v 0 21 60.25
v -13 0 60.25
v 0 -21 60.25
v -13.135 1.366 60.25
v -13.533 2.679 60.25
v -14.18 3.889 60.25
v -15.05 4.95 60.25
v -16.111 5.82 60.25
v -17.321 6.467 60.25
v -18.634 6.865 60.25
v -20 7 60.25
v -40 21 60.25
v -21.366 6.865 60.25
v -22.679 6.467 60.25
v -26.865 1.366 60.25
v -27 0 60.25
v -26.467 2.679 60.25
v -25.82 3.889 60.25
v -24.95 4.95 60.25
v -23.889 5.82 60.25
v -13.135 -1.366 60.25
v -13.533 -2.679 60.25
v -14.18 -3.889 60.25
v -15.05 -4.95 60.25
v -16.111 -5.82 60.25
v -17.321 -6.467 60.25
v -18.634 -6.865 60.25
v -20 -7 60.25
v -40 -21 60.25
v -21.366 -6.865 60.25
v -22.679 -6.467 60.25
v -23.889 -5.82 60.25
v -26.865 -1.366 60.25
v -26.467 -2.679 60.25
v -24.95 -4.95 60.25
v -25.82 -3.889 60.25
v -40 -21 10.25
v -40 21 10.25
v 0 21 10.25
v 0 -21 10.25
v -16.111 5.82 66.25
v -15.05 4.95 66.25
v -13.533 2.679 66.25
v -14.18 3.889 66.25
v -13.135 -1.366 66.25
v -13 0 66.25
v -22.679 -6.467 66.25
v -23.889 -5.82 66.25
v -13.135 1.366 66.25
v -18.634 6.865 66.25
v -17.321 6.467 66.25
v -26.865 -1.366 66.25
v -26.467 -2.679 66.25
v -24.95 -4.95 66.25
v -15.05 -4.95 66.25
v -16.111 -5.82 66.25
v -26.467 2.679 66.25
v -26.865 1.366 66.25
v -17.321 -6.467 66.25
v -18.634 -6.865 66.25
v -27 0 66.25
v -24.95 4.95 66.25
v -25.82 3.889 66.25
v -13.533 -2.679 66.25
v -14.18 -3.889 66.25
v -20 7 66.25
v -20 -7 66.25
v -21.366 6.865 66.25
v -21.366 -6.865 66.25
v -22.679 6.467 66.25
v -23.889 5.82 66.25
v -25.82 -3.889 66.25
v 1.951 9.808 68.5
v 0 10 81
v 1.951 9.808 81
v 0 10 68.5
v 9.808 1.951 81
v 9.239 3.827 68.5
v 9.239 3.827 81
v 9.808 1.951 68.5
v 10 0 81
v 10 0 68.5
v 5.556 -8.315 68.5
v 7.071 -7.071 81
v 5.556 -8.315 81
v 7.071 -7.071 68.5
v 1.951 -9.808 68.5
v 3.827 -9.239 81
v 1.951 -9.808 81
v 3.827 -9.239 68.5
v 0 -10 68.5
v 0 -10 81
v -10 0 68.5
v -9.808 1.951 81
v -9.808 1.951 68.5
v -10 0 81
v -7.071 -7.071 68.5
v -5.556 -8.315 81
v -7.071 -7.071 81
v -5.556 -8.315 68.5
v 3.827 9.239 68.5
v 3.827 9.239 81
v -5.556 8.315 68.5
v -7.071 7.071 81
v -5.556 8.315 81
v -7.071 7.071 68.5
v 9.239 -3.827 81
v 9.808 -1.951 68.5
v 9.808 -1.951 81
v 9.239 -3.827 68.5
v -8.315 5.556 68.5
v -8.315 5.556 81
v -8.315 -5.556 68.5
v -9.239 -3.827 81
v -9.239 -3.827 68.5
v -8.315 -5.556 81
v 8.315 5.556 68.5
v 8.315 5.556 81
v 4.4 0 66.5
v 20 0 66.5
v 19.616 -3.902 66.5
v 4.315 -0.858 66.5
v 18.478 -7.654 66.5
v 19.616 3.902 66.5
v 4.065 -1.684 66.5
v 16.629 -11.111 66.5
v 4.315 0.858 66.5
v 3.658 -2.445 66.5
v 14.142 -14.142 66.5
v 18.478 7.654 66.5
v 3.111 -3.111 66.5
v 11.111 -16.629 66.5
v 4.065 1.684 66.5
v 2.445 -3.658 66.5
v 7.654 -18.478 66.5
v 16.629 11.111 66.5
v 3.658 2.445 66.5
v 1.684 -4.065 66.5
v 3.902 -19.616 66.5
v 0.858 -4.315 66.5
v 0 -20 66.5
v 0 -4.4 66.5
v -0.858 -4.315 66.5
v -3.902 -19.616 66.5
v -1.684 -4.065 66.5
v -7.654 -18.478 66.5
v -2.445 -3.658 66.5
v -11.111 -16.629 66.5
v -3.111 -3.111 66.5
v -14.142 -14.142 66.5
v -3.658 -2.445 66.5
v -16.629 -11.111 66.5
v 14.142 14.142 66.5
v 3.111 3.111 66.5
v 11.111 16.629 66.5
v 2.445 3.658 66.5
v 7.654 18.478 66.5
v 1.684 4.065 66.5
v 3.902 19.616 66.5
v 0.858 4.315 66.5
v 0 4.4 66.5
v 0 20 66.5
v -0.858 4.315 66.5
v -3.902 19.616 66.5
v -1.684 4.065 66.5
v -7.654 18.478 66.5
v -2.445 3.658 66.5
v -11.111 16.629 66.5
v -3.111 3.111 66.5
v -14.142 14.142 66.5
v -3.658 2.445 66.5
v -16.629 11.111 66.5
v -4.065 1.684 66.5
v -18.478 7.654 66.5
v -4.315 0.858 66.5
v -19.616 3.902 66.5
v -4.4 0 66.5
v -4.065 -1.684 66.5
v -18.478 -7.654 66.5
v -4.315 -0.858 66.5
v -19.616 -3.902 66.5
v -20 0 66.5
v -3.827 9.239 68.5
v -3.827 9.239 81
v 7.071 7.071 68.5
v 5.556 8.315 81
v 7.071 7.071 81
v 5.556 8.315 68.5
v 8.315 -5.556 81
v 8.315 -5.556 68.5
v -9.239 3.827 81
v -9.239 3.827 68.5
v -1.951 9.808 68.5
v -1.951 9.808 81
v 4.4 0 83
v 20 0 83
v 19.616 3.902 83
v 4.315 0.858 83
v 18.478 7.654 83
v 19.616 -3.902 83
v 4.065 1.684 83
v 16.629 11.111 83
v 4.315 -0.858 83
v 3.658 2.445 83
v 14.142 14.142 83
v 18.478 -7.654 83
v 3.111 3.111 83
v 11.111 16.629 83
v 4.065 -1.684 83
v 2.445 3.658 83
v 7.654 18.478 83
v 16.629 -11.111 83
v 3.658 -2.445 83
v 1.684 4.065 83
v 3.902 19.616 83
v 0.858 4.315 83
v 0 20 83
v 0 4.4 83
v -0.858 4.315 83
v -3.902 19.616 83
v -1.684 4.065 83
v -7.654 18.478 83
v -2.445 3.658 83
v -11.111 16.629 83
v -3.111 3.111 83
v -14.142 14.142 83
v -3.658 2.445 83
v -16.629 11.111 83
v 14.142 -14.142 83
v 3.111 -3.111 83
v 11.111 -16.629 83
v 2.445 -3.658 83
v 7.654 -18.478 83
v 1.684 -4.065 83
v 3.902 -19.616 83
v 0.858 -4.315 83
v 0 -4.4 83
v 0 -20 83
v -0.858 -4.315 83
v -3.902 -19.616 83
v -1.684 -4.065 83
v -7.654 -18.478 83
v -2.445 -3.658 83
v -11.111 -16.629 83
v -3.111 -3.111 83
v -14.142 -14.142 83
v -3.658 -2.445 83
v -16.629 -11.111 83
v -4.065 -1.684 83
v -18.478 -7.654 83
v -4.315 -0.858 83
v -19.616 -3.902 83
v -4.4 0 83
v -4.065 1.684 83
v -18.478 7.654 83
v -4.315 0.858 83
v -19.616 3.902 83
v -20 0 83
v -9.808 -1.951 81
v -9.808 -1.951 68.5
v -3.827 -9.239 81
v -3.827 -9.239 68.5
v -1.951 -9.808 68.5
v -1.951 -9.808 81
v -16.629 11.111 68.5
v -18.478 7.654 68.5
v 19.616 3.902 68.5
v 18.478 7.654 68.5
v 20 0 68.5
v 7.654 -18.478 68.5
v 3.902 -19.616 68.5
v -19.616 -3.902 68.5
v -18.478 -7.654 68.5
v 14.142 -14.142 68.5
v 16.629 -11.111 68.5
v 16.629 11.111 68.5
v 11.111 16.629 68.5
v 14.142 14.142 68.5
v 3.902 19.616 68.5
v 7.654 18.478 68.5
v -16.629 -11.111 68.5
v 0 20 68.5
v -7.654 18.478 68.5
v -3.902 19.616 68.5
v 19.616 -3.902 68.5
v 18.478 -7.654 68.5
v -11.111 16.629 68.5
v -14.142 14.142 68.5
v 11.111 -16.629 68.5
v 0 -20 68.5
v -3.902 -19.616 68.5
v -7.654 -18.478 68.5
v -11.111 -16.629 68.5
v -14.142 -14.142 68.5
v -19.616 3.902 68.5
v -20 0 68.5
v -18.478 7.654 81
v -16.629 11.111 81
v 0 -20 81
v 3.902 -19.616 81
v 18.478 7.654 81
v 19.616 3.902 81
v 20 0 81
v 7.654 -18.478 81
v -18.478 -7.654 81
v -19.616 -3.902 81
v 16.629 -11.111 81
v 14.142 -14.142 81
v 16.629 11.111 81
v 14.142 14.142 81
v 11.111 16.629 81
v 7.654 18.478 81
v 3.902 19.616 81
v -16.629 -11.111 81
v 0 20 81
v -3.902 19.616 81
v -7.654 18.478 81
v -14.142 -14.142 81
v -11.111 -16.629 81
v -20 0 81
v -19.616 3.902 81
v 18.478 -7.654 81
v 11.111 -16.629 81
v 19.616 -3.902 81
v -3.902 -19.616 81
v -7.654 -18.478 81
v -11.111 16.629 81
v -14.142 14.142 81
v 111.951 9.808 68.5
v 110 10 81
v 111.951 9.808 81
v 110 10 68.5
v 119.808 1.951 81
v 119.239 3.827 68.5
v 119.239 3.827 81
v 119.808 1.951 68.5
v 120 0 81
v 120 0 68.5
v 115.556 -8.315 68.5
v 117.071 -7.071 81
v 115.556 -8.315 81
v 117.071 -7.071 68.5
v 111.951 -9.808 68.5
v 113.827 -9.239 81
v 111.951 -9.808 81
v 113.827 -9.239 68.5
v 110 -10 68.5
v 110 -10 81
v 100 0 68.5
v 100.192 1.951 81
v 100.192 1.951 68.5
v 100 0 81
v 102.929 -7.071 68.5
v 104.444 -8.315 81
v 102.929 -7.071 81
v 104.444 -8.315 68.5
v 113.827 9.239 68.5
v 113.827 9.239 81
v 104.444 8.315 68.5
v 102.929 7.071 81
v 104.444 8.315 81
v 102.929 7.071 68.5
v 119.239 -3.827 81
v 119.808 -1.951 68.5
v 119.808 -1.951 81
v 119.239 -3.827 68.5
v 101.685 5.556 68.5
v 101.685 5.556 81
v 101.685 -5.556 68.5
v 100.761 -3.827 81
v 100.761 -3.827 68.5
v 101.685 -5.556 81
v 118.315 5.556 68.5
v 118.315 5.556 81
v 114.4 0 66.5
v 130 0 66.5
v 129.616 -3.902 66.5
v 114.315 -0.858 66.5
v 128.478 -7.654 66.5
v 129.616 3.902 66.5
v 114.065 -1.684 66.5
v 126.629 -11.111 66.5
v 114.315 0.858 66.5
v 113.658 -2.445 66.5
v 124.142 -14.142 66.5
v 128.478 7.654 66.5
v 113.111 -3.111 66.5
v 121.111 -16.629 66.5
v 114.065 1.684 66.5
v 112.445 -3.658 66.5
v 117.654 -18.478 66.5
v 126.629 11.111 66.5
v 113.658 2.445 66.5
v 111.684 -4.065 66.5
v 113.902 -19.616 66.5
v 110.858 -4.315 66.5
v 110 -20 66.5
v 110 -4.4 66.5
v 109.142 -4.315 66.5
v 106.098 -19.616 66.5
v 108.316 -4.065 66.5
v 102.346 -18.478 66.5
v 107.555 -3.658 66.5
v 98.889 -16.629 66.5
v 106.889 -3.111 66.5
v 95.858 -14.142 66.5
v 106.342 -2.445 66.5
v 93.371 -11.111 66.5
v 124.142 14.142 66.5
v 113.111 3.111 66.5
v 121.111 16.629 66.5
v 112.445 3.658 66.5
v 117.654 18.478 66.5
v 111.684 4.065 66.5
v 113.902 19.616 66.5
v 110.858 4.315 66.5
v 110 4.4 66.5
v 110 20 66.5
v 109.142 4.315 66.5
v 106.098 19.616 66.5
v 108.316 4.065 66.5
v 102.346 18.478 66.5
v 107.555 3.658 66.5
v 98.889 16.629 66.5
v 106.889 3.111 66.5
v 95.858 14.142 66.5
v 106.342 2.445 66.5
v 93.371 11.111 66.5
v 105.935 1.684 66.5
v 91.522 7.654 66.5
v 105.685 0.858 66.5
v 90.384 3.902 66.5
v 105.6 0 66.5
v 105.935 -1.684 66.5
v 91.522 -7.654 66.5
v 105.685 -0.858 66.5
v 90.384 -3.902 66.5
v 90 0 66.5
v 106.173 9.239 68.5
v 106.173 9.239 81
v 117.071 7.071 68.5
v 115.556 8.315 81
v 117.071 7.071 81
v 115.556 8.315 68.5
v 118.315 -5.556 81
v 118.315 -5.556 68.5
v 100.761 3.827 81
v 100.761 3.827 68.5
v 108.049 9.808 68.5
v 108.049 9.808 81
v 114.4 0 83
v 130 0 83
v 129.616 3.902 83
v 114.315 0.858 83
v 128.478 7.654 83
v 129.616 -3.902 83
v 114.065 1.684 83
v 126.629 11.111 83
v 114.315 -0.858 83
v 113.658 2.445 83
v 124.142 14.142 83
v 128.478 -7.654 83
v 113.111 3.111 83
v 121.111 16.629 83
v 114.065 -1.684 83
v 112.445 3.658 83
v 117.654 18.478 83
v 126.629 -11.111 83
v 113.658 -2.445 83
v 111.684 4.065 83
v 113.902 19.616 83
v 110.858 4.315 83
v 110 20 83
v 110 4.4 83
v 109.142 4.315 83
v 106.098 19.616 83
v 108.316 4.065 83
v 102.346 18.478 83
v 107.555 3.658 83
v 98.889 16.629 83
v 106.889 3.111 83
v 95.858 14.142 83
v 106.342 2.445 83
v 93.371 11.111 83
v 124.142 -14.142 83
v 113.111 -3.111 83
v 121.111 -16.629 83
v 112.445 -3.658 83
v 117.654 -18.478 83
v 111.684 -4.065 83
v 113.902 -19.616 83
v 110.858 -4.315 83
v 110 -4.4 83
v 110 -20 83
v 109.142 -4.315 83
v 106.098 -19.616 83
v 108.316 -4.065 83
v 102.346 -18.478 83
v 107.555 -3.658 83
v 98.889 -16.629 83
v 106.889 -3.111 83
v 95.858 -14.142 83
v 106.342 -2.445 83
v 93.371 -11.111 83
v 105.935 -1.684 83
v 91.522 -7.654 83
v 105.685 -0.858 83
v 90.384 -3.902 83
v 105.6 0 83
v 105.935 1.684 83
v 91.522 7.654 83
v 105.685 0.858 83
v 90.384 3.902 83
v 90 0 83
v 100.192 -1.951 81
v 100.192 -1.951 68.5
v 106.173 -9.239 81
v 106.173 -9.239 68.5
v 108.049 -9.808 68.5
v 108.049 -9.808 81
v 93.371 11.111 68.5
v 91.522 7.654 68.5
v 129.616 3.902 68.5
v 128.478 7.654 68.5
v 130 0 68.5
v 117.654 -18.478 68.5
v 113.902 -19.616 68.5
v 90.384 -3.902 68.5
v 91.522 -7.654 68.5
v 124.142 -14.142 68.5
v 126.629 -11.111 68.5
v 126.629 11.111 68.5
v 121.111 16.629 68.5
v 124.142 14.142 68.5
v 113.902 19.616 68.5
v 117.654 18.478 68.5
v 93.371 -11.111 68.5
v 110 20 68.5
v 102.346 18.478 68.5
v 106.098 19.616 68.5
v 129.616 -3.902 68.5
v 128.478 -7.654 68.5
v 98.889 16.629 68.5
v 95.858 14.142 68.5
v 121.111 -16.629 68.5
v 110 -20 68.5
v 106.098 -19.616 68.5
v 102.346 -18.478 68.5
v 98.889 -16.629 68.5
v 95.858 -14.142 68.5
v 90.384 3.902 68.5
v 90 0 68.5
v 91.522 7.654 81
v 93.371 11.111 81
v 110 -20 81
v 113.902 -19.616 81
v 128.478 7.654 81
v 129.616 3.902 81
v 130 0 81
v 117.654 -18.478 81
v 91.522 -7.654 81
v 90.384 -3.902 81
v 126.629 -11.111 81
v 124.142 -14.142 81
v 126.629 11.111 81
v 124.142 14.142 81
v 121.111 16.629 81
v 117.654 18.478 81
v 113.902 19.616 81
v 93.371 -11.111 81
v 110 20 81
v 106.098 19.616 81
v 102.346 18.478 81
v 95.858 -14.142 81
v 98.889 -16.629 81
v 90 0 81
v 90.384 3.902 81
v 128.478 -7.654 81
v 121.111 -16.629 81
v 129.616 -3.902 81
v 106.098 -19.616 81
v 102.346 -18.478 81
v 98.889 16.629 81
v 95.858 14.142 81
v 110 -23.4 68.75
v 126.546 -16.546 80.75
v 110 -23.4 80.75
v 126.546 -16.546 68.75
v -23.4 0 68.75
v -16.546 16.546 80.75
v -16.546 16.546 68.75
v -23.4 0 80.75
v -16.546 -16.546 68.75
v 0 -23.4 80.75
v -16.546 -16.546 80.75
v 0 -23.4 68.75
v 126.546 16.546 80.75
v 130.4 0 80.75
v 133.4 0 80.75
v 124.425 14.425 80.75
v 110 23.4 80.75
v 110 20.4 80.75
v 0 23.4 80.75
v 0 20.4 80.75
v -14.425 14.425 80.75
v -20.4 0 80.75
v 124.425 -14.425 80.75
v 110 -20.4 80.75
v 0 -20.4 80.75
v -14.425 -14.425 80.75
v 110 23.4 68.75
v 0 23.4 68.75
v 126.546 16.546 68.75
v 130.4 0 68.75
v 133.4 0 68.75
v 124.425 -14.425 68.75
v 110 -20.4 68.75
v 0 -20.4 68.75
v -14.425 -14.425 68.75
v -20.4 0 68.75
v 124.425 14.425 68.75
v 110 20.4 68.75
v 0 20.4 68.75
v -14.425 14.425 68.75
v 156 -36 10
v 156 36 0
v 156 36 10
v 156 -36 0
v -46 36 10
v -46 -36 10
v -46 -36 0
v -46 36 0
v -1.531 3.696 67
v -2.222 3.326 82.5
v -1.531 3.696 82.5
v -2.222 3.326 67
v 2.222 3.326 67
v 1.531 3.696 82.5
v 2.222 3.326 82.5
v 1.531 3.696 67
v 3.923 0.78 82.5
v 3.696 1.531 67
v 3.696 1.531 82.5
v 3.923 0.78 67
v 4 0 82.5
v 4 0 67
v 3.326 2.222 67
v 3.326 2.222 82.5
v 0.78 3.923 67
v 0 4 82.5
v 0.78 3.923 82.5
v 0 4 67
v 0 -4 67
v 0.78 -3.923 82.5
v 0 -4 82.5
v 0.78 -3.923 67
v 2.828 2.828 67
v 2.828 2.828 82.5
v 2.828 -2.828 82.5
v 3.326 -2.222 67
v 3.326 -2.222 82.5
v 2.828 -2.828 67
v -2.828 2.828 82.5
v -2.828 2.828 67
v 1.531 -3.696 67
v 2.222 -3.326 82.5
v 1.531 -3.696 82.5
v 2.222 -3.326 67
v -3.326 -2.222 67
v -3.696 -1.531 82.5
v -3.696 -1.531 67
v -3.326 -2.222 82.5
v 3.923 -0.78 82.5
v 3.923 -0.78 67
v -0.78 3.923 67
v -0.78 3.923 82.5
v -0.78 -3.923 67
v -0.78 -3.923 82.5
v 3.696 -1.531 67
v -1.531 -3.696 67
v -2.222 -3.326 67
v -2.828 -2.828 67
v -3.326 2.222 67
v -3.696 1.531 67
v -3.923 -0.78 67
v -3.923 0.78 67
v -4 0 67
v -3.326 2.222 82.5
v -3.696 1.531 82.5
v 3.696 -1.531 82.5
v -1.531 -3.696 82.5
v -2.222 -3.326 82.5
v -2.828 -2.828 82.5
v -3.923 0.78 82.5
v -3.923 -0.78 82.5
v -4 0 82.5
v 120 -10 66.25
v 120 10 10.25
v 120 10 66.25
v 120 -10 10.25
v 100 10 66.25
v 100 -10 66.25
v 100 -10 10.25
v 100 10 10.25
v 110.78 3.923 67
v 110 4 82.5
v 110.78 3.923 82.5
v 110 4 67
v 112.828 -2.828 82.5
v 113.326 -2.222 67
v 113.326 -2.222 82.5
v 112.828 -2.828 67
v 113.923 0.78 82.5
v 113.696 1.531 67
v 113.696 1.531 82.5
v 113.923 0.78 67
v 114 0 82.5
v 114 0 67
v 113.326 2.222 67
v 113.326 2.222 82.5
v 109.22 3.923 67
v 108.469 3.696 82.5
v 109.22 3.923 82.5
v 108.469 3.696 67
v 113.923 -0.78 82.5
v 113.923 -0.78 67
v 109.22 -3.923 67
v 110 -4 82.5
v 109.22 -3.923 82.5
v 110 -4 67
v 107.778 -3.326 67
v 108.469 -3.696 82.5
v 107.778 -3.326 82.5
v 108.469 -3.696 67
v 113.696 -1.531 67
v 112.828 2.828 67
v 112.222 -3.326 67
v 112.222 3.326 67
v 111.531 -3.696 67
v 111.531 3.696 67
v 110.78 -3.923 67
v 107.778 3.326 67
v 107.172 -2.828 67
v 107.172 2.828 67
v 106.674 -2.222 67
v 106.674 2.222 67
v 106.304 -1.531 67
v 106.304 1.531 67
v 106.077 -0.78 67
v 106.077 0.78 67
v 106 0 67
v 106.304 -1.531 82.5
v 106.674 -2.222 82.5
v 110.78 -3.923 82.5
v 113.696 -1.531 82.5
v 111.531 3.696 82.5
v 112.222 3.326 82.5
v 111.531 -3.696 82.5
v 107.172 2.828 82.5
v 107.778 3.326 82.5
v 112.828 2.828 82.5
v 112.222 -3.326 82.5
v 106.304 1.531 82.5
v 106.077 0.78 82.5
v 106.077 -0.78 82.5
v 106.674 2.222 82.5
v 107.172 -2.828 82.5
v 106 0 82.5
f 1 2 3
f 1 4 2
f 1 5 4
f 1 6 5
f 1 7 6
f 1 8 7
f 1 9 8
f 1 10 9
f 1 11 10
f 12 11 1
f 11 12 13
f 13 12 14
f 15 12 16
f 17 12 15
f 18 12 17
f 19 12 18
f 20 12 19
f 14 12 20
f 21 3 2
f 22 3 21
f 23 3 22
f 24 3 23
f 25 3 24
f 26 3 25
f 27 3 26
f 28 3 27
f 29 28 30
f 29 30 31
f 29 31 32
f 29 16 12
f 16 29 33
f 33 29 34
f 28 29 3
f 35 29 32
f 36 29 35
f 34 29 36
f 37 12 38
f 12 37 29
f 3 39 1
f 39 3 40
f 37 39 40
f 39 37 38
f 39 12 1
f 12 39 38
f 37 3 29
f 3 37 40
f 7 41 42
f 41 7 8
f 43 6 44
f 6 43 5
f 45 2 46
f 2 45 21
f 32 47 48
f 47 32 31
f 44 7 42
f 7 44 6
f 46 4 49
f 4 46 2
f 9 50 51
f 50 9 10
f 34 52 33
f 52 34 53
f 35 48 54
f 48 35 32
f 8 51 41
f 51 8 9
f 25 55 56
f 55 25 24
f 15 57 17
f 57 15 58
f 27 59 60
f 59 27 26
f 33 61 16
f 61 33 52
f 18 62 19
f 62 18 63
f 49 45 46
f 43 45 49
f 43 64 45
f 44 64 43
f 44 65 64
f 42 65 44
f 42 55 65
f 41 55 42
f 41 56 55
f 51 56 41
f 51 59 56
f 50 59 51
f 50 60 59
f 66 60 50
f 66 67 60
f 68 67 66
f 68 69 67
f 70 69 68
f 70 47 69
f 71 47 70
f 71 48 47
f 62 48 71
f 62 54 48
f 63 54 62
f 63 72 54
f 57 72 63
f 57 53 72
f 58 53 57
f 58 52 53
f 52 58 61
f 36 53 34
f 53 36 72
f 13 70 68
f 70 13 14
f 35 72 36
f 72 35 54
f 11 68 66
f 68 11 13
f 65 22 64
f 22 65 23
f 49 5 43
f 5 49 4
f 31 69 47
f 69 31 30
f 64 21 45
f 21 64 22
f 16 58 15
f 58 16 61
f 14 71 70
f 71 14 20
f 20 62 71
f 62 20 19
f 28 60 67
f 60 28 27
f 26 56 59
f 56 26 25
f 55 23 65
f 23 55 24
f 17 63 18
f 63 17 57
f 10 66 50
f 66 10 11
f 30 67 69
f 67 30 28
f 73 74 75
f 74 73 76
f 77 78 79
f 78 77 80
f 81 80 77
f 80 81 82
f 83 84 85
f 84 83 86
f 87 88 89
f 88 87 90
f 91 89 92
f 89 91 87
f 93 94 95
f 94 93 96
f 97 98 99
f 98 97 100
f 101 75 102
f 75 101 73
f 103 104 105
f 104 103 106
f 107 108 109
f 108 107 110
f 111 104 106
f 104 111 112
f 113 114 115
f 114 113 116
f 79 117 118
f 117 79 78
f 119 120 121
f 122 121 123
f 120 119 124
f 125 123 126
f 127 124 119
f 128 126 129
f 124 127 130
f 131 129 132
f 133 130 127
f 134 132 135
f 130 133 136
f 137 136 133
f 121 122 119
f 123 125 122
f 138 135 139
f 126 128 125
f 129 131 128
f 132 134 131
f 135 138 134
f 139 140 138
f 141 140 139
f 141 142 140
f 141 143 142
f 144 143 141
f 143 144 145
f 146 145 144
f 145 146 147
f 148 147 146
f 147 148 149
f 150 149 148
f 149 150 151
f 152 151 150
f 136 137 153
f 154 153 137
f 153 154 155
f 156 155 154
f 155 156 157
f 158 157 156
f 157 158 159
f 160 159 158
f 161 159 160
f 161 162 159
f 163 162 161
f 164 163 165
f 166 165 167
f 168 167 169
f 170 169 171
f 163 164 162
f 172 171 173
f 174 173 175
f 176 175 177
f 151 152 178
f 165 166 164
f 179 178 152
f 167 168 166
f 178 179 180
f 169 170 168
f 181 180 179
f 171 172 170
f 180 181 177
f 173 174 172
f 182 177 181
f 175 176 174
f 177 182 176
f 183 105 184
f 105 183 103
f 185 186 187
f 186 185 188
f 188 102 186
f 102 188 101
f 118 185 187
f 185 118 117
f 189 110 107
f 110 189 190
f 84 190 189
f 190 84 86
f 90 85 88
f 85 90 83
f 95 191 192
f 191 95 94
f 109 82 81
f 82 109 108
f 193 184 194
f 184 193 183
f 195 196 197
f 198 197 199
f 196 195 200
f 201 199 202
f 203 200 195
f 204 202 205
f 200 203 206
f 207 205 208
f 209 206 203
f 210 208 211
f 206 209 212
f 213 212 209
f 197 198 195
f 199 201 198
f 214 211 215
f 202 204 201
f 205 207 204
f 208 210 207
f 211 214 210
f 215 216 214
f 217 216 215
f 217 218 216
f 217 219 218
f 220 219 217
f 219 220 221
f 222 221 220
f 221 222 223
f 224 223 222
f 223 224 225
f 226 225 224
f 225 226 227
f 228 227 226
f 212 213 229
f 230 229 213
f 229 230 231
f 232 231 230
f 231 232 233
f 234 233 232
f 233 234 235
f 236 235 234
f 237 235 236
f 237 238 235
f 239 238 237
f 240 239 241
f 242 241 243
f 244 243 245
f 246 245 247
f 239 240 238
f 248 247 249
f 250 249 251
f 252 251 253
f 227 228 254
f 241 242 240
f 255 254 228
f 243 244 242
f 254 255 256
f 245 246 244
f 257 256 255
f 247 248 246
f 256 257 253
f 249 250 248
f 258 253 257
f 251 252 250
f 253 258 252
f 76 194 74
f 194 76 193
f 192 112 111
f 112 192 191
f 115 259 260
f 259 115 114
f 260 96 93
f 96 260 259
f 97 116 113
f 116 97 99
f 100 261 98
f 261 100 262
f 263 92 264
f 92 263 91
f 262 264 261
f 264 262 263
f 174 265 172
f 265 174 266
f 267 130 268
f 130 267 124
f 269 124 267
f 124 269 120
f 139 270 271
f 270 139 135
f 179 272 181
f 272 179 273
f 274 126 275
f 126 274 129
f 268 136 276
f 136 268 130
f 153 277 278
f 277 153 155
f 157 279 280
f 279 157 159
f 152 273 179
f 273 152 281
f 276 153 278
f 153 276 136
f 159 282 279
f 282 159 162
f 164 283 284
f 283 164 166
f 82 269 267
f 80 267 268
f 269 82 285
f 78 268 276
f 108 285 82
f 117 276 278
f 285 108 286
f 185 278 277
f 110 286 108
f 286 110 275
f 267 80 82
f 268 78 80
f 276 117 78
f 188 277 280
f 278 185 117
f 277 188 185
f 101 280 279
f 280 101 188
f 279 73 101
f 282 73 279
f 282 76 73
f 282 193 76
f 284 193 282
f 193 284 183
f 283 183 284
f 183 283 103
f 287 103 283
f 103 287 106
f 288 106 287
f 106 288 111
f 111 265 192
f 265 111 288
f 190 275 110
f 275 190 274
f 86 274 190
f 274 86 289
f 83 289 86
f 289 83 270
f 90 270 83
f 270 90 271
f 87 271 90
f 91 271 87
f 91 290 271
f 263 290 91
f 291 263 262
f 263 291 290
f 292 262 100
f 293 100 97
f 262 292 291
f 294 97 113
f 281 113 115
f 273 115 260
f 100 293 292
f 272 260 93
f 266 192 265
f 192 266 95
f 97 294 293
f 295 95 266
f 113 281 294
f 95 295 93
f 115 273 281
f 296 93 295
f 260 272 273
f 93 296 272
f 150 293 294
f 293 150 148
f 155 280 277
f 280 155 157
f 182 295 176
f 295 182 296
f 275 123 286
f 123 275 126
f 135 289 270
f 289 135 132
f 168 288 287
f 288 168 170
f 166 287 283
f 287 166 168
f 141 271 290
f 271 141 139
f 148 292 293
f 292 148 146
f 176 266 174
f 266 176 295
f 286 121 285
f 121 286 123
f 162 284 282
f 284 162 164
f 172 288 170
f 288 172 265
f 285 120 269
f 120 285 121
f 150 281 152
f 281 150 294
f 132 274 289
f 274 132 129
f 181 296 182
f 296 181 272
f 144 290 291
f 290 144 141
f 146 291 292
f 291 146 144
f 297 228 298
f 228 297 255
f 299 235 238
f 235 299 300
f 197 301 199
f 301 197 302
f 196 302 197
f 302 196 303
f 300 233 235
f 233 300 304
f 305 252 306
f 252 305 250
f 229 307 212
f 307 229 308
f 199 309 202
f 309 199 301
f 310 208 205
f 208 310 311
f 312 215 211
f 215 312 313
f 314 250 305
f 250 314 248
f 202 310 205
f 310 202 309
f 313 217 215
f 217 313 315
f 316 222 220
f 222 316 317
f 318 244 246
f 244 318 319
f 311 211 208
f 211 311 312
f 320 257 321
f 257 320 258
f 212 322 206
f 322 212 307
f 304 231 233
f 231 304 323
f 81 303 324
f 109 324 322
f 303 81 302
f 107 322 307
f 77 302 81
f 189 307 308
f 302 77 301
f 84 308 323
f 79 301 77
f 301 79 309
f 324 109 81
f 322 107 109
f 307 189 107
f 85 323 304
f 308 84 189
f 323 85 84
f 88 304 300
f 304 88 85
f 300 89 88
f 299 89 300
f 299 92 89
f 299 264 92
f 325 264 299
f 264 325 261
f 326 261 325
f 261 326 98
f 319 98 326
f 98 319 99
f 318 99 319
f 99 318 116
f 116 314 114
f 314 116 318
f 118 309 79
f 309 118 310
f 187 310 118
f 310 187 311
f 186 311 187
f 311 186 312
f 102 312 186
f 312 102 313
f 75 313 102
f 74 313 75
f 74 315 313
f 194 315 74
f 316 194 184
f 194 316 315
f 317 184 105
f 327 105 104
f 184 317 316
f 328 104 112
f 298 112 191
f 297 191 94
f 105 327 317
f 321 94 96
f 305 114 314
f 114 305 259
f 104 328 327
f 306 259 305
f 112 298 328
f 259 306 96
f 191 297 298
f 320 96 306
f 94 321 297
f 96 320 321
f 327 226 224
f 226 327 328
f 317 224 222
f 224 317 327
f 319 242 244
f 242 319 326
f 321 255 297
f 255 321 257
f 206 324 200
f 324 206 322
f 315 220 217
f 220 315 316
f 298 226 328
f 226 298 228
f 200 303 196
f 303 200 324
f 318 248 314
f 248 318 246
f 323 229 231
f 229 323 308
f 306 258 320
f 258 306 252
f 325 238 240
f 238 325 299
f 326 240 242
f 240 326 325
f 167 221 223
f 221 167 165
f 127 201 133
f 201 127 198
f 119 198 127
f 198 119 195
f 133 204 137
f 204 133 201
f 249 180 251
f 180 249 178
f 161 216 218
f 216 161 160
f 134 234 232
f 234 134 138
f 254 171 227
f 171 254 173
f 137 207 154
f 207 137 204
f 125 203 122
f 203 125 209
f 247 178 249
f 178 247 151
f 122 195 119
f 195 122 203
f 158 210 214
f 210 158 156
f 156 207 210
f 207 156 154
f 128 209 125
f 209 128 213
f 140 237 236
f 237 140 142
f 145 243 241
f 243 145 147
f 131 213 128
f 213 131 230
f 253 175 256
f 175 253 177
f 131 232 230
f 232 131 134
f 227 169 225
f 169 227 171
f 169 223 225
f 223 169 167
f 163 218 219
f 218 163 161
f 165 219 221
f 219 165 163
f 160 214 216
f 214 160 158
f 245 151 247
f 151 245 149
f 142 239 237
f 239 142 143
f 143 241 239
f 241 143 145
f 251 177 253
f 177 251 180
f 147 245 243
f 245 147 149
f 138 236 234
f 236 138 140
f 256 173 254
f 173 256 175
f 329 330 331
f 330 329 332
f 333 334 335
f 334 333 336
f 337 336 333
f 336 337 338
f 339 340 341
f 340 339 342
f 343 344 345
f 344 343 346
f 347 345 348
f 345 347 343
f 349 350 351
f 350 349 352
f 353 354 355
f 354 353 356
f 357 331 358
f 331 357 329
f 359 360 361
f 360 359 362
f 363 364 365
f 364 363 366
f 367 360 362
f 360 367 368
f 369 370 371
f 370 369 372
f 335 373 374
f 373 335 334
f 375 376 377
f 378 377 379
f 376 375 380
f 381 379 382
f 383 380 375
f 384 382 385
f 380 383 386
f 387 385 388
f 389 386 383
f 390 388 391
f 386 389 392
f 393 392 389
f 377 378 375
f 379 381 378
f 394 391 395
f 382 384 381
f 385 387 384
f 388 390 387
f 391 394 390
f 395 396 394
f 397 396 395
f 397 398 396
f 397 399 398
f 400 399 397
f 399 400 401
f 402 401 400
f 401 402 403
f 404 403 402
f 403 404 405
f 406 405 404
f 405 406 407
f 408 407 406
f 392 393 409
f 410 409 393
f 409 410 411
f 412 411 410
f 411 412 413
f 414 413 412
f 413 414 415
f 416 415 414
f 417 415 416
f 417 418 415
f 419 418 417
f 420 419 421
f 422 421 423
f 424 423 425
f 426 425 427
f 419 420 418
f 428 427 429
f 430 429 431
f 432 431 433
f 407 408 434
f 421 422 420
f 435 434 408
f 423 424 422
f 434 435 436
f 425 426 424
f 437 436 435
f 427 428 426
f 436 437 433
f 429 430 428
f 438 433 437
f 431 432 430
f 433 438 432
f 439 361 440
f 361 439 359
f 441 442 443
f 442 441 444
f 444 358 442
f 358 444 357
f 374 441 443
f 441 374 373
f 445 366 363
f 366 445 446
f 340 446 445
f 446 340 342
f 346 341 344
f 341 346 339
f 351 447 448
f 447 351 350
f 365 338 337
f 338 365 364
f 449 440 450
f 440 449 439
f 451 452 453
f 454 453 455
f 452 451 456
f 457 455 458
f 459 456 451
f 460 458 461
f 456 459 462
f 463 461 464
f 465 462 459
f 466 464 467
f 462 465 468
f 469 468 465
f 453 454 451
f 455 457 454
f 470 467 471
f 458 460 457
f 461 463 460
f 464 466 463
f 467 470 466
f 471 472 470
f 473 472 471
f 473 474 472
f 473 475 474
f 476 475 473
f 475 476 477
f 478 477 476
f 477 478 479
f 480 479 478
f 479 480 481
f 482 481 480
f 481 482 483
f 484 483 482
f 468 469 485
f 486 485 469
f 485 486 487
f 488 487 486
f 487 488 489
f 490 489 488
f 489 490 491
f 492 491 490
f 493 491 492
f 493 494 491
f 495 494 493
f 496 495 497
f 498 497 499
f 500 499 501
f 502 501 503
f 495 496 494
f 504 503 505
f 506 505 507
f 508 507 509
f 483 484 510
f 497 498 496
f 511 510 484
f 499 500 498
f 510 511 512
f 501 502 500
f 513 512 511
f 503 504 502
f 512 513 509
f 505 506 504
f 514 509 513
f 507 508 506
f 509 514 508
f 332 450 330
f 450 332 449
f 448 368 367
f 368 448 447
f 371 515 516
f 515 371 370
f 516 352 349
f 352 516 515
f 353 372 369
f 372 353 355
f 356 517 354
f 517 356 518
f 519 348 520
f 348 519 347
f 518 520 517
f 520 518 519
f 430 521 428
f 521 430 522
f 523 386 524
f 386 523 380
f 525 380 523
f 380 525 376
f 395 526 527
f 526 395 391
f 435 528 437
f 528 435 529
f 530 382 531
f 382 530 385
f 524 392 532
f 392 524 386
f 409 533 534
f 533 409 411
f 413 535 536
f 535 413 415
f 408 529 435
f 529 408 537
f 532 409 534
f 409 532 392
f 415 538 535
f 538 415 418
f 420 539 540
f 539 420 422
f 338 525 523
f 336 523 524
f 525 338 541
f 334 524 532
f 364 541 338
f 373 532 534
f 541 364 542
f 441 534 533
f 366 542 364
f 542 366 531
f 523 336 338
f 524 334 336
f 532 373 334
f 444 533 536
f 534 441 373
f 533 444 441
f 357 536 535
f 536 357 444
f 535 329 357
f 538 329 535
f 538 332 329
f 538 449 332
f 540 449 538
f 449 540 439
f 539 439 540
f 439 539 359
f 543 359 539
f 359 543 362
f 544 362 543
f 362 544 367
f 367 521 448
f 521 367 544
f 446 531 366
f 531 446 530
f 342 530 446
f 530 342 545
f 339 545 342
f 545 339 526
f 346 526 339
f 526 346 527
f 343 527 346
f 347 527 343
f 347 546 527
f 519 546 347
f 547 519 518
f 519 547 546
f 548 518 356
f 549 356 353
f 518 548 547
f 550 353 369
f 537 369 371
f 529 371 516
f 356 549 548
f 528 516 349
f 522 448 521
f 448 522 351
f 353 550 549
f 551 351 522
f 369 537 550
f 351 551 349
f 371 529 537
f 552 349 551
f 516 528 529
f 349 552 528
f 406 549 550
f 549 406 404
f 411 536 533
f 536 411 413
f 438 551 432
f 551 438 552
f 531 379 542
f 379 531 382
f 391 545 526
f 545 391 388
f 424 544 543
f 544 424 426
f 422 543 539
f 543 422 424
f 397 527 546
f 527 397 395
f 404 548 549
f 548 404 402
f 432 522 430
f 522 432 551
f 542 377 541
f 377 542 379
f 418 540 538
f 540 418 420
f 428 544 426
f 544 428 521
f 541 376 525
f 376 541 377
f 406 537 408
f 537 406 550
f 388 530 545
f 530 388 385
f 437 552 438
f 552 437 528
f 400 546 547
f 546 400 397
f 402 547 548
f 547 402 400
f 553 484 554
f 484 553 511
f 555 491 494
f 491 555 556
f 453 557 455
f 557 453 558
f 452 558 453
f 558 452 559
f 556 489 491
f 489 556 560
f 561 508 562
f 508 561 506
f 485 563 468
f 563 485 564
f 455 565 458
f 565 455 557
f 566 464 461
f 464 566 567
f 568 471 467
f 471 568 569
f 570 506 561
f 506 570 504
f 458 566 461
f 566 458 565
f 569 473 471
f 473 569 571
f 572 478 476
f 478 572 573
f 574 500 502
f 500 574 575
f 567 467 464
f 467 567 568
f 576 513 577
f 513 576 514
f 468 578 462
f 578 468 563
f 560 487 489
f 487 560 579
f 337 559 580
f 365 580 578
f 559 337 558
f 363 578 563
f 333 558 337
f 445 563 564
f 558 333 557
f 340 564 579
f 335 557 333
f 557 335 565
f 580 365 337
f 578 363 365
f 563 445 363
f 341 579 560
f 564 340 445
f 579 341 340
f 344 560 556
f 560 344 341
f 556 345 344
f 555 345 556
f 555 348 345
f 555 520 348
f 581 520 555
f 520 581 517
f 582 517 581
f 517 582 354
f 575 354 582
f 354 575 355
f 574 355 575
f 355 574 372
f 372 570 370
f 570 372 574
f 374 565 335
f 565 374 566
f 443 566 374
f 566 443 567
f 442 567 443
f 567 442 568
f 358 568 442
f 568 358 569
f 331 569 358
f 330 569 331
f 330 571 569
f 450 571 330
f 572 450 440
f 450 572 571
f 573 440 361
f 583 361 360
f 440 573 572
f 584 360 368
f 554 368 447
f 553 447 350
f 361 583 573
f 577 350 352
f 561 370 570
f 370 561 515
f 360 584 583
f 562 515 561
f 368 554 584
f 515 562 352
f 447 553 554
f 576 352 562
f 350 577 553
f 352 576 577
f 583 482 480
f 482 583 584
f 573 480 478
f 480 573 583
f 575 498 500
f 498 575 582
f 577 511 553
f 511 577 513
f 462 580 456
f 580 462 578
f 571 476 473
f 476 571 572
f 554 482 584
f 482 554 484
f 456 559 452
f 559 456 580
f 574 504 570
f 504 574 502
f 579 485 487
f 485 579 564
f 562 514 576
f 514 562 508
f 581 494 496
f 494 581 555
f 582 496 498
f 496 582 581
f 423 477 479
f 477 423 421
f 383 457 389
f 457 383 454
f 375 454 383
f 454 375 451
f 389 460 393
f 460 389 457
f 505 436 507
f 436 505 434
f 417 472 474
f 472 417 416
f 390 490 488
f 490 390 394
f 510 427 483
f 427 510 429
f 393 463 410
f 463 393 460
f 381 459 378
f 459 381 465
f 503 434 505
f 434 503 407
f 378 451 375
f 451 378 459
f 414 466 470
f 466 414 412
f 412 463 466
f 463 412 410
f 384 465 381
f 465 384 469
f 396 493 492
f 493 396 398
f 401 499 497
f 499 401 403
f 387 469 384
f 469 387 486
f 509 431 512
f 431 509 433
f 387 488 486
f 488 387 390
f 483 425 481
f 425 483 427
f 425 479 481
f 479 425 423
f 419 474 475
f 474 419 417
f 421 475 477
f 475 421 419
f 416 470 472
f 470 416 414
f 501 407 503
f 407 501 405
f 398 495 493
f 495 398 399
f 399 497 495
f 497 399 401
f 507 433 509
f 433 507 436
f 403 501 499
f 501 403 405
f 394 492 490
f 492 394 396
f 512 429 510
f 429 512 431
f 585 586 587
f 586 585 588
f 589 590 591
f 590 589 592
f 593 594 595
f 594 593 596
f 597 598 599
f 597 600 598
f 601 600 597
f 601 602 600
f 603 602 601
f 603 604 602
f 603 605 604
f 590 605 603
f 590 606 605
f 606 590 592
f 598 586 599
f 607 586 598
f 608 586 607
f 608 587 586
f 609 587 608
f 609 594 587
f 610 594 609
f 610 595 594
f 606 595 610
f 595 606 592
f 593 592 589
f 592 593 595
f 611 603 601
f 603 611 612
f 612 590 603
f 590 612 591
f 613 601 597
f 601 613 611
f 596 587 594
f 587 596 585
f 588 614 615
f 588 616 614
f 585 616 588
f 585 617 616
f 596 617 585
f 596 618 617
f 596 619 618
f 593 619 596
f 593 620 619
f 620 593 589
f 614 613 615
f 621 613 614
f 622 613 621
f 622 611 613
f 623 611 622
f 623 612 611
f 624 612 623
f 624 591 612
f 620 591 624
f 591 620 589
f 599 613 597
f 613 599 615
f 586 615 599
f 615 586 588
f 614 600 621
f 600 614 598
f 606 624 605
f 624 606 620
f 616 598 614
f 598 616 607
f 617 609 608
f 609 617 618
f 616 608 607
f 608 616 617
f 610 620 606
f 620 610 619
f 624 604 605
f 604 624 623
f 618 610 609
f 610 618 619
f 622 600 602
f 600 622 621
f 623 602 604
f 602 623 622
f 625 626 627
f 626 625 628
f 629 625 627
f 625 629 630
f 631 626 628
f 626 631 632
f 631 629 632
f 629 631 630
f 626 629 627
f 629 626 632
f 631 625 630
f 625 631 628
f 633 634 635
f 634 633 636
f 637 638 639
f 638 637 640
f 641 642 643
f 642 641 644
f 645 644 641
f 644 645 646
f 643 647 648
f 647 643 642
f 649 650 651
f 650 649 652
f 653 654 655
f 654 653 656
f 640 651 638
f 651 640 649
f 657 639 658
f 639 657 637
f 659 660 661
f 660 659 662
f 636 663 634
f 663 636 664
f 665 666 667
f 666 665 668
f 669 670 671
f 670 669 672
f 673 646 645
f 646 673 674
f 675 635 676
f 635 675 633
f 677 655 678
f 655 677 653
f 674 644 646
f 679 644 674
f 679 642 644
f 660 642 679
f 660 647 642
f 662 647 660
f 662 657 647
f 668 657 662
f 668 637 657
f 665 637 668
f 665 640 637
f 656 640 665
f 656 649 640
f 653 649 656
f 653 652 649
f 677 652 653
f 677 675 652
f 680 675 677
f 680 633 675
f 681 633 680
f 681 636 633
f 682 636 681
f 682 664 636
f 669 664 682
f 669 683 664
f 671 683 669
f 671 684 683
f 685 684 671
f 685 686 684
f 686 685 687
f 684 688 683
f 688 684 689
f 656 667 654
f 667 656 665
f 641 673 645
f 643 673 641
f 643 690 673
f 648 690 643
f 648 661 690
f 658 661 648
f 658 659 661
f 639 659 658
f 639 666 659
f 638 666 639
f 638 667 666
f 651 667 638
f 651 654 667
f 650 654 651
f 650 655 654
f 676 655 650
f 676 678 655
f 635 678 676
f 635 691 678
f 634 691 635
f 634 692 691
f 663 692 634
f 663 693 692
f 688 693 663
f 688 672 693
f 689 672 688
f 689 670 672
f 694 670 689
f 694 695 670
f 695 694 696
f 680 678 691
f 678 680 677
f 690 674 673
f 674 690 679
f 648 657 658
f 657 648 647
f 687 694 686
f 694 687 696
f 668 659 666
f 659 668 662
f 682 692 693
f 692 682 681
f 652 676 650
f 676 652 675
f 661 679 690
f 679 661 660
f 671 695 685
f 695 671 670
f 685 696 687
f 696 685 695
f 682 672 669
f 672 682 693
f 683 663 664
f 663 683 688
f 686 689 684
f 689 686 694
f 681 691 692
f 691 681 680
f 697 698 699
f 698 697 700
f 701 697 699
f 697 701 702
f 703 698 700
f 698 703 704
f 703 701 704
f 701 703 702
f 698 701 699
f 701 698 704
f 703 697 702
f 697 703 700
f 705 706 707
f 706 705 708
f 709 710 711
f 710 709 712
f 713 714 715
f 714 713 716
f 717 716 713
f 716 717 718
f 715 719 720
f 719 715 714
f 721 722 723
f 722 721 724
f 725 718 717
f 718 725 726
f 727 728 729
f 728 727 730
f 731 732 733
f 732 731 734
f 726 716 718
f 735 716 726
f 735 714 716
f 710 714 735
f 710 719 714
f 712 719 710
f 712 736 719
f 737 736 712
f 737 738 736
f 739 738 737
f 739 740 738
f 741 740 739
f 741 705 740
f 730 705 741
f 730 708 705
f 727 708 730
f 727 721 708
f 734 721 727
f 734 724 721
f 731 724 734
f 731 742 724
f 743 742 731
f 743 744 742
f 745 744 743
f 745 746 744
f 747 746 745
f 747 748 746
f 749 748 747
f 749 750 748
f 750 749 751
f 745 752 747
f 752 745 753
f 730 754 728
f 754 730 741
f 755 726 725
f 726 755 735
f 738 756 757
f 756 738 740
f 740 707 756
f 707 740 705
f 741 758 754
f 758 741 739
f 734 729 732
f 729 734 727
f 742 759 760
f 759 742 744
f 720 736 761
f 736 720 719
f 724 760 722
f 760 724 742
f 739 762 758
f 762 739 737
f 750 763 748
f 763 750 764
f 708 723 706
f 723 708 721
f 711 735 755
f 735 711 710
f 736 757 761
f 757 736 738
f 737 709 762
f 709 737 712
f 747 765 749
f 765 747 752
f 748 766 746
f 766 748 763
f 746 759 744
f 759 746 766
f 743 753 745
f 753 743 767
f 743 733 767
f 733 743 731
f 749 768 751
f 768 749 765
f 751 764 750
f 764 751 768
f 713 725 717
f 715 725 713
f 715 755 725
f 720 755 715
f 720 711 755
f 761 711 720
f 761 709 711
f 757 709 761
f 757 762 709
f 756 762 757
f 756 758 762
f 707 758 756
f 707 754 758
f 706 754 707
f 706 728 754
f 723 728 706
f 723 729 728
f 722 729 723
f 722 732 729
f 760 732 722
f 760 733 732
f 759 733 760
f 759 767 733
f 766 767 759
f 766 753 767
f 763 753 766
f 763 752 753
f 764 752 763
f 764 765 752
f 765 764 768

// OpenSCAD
$fn = 32;

// ------------------------------------------------------------------------
// Motor belt drive: span 110 mm, pulleys d40, belt 12 mm wide
// Every part is its own module, assembly() places every instance.
// ------------------------------------------------------------------------

// --- part 1 ---
module base_plate() {
  difference() {
    translate([-101, -36, 0]) cube([202, 72, 10]);
  }
}

// --- part 2 ---
module motor() {
  union() {
    translate([-25, -21, 0]) cube([50, 42, 40]);
    translate([28, 0, 20]) rotate([0, 90, 0]) cylinder(h = 6, d = 14, center = true);
  }
}

// --- part 3 ---
module drive_shaft() {
  translate([0, 0, -7.75]) cylinder(h = 15.5, d = 8);
}

// --- part 4 ---
module pulley_drive() {
  difference() {
    union() {
      cylinder(h = 16.5, d = 20);
      cylinder(h = 2, d = 40);
      translate([0, 0, 14.5]) cylinder(h = 2, d = 40);
    }
    translate([0, 0, -1]) cylinder(h = 18.5, d = 8.8);
  }
}

// --- part 5 ---
module idler_post() {
  translate([-10, -10, 0]) cube([20, 20, 56]);
}

// --- part 6 ---
module driven_shaft() {
  translate([0, 0, -7.75]) cylinder(h = 15.5, d = 8);
}

// --- part 7 ---
module pulley_driven() {
  difference() {
    union() {
      cylinder(h = 16.5, d = 20);
      cylinder(h = 2, d = 40);
      translate([0, 0, 14.5]) cylinder(h = 2, d = 40);
    }
    translate([0, 0, -1]) cylinder(h = 18.5, d = 8.8);
  }
}

// --- part 8 ---
module drive_belt() {
  difference() {
    linear_extrude(height = 12) polygon(points = concat([for (a = [90 : 45 : 270]) [23.4 * cos(a), 23.4 * sin(a)]], [for (a = [270 : 45 : 450]) [110 + 23.4 * cos(a), 23.4 * sin(a)]]));
    translate([0, 0, -1]) linear_extrude(height = 14) polygon(points = concat([for (a = [90 : 45 : 270]) [20.4 * cos(a), 20.4 * sin(a)]], [for (a = [270 : 45 : 450]) [110 + 20.4 * cos(a), 20.4 * sin(a)]]));
  }
}

// --- assembly ---
module assembly() {
  color([0.80, 0.24, 0.20]) translate([55, 0, 0]) rotate([0, 0, 0]) base_plate();
  color([0.20, 0.45, 0.75]) translate([0, 0, 35.25]) rotate([0, 270, 0]) motor();
  color([0.25, 0.62, 0.32]) translate([0, 0, 74.75]) rotate([0, 0, 0]) drive_shaft();
  color([0.92, 0.70, 0.18]) translate([0, 0, 66.5]) rotate([0, 0, 0]) pulley_drive();
  color([0.58, 0.35, 0.70]) translate([110, 0, 10.25]) rotate([0, 0, 0]) idler_post();
  color([0.16, 0.66, 0.66]) translate([110, 0, 74.75]) rotate([0, 0, 0]) driven_shaft();
  color([0.85, 0.48, 0.18]) translate([110, 0, 66.5]) rotate([0, 0, 0]) pulley_driven();
  color([0.55, 0.60, 0.65]) translate([0, 0, 68.75]) rotate([0, 0, 0]) drive_belt();
}

assembly();
